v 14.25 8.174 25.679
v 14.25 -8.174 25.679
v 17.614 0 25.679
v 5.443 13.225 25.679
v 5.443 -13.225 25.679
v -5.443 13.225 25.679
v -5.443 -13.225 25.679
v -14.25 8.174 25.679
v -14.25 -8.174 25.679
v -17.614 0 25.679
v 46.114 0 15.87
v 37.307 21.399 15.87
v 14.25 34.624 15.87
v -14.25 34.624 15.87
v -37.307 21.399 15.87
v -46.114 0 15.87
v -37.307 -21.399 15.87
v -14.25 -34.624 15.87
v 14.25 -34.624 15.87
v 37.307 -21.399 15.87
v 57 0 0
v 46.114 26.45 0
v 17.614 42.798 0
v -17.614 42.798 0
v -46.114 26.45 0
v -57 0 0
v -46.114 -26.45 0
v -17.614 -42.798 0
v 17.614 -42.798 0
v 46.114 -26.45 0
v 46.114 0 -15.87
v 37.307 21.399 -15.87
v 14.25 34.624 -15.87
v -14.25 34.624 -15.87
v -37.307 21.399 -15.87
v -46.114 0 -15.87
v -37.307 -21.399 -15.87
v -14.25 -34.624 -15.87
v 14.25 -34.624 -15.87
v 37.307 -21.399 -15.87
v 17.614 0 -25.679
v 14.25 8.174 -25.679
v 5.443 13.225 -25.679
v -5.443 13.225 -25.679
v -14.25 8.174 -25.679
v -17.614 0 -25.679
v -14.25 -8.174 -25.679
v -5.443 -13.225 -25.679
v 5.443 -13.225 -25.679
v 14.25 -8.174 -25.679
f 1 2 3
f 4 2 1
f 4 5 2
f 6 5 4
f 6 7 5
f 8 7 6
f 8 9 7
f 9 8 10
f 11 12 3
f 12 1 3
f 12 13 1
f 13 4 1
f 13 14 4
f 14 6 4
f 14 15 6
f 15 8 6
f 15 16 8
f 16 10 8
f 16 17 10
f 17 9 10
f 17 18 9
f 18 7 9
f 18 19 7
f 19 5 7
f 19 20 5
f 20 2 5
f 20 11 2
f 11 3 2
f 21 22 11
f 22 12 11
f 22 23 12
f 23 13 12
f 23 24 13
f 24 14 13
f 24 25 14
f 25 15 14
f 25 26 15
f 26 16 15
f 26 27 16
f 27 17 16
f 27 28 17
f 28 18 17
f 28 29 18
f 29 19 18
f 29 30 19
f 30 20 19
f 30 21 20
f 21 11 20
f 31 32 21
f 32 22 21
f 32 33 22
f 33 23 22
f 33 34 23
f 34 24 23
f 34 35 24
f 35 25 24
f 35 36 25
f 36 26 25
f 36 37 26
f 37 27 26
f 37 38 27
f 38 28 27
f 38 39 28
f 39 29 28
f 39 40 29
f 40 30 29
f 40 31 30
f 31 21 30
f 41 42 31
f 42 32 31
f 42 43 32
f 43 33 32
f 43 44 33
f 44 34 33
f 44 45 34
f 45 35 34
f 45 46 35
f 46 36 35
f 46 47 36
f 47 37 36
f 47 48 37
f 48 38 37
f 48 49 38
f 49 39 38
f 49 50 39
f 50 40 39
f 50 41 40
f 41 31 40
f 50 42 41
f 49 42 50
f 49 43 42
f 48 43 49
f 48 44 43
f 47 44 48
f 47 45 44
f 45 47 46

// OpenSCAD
// Generated by SolidPython 1.0.1 on 2020-07-29 00:46:54


scale(v = [19, 15, 9]) {
	sphere(r = 3);
}
/***********************************************
*********      SolidPython code:      **********
************************************************
 
# import packages: SolidPython
from solid import *
from solid.utils import *
from itertools import chain, combinations, permutations


class Resize:

    def __init__(self, scad_file):
        self.scad_file = scad_file
        #self.scad_file = import_scad(scad_file)
        # cone/cylinder param:
        self.r1 = 0
        self.r2 = 0
        self.h = 0
        # rectangular prism param:
        self.w = 0
        self.l = 0
        # ellipse param:
        self.r = 0

    # import OpenScad code (file name corresponds to shape)


    # classify shape + parameters
    def assign(self, param1, param2, param3):
        if self.scad_file == 'cone.scad':
            self.r1 = param1
            self.r2 = param2
            self.h = param3
        elif self.scad_file == 'cylinder.scad':
            self.r1 = param1
            self.r2 = param2
            self.h = param3
        elif self.scad_file == 'rectangularPrism.scad':
            self.h = param1
            self.l = param2
            self.w = param3
        else:
            self.r = param1
            self.h = param2

    # resize parameters
    def iterate(self):
        x = range(3, 20, 2)
        i = 1
        if self.scad_file == 'cone.scad':
            tempList = list(permutations(x, 2))
            for temp in tempList:
                param1 = temp[0]
                param2 = temp[1]
                filepath = 'produced_scad_files/' + 'cone' + str(param1) + '_' + str(param2) + '_' + '.scad'
                scad_render_to_file(cylinder(h=param1, r1=param2, r2=0), filepath)

        elif self.scad_file == 'cylinder.scad':
            tempList = list(permutations(x, 3))
            for temp in tempList:
                param1 = temp[0]
                param2 = temp[1]
                filepath = 'produced_scad_files/' + 'cylinder' + str(param1) + '_' + str(param2) + '_' + '.scad'
                scad_render_to_file(cylinder(h=param1, r1=param2, r2=param2), filepath)

        elif self.scad_file == 'rectangularPrism.scad':
            tempList = list(permutations(x, 3))
            for temp in tempList:
                param1 = temp[0]
                param2 = temp[1]
                param3 = temp[2]
                filepath = 'produced_scad_files/' + 'rectangularPrism' + str(param1) + '_' + str(param2) + '_' + str(
                    param3) + '.scad'
                scad_render_to_file(cube(size=(param1, param2, param3)), filepath)

        elif self.scad_file == 'ellipse.scad':
            tempList = list(permutations(x, 4))
            for temp in tempList:
                param1 = temp[0]
                param2 = temp[1]
                param3 = temp[2]
                param4 = temp[3]
                filepath = 'produced_scad_files/' + 'ellipse' + str(param1) + '_' + str(param2) + '_' + str(param3) + '_' + str(param4) + '.scad'
                scad_render_to_file(scale([param1, param2, param3])(sphere(r=param4)), filepath)

    def render_to_scadfile(self):
        scad_render_to_file(scad, 'example.scad') 
 
************************************************/
